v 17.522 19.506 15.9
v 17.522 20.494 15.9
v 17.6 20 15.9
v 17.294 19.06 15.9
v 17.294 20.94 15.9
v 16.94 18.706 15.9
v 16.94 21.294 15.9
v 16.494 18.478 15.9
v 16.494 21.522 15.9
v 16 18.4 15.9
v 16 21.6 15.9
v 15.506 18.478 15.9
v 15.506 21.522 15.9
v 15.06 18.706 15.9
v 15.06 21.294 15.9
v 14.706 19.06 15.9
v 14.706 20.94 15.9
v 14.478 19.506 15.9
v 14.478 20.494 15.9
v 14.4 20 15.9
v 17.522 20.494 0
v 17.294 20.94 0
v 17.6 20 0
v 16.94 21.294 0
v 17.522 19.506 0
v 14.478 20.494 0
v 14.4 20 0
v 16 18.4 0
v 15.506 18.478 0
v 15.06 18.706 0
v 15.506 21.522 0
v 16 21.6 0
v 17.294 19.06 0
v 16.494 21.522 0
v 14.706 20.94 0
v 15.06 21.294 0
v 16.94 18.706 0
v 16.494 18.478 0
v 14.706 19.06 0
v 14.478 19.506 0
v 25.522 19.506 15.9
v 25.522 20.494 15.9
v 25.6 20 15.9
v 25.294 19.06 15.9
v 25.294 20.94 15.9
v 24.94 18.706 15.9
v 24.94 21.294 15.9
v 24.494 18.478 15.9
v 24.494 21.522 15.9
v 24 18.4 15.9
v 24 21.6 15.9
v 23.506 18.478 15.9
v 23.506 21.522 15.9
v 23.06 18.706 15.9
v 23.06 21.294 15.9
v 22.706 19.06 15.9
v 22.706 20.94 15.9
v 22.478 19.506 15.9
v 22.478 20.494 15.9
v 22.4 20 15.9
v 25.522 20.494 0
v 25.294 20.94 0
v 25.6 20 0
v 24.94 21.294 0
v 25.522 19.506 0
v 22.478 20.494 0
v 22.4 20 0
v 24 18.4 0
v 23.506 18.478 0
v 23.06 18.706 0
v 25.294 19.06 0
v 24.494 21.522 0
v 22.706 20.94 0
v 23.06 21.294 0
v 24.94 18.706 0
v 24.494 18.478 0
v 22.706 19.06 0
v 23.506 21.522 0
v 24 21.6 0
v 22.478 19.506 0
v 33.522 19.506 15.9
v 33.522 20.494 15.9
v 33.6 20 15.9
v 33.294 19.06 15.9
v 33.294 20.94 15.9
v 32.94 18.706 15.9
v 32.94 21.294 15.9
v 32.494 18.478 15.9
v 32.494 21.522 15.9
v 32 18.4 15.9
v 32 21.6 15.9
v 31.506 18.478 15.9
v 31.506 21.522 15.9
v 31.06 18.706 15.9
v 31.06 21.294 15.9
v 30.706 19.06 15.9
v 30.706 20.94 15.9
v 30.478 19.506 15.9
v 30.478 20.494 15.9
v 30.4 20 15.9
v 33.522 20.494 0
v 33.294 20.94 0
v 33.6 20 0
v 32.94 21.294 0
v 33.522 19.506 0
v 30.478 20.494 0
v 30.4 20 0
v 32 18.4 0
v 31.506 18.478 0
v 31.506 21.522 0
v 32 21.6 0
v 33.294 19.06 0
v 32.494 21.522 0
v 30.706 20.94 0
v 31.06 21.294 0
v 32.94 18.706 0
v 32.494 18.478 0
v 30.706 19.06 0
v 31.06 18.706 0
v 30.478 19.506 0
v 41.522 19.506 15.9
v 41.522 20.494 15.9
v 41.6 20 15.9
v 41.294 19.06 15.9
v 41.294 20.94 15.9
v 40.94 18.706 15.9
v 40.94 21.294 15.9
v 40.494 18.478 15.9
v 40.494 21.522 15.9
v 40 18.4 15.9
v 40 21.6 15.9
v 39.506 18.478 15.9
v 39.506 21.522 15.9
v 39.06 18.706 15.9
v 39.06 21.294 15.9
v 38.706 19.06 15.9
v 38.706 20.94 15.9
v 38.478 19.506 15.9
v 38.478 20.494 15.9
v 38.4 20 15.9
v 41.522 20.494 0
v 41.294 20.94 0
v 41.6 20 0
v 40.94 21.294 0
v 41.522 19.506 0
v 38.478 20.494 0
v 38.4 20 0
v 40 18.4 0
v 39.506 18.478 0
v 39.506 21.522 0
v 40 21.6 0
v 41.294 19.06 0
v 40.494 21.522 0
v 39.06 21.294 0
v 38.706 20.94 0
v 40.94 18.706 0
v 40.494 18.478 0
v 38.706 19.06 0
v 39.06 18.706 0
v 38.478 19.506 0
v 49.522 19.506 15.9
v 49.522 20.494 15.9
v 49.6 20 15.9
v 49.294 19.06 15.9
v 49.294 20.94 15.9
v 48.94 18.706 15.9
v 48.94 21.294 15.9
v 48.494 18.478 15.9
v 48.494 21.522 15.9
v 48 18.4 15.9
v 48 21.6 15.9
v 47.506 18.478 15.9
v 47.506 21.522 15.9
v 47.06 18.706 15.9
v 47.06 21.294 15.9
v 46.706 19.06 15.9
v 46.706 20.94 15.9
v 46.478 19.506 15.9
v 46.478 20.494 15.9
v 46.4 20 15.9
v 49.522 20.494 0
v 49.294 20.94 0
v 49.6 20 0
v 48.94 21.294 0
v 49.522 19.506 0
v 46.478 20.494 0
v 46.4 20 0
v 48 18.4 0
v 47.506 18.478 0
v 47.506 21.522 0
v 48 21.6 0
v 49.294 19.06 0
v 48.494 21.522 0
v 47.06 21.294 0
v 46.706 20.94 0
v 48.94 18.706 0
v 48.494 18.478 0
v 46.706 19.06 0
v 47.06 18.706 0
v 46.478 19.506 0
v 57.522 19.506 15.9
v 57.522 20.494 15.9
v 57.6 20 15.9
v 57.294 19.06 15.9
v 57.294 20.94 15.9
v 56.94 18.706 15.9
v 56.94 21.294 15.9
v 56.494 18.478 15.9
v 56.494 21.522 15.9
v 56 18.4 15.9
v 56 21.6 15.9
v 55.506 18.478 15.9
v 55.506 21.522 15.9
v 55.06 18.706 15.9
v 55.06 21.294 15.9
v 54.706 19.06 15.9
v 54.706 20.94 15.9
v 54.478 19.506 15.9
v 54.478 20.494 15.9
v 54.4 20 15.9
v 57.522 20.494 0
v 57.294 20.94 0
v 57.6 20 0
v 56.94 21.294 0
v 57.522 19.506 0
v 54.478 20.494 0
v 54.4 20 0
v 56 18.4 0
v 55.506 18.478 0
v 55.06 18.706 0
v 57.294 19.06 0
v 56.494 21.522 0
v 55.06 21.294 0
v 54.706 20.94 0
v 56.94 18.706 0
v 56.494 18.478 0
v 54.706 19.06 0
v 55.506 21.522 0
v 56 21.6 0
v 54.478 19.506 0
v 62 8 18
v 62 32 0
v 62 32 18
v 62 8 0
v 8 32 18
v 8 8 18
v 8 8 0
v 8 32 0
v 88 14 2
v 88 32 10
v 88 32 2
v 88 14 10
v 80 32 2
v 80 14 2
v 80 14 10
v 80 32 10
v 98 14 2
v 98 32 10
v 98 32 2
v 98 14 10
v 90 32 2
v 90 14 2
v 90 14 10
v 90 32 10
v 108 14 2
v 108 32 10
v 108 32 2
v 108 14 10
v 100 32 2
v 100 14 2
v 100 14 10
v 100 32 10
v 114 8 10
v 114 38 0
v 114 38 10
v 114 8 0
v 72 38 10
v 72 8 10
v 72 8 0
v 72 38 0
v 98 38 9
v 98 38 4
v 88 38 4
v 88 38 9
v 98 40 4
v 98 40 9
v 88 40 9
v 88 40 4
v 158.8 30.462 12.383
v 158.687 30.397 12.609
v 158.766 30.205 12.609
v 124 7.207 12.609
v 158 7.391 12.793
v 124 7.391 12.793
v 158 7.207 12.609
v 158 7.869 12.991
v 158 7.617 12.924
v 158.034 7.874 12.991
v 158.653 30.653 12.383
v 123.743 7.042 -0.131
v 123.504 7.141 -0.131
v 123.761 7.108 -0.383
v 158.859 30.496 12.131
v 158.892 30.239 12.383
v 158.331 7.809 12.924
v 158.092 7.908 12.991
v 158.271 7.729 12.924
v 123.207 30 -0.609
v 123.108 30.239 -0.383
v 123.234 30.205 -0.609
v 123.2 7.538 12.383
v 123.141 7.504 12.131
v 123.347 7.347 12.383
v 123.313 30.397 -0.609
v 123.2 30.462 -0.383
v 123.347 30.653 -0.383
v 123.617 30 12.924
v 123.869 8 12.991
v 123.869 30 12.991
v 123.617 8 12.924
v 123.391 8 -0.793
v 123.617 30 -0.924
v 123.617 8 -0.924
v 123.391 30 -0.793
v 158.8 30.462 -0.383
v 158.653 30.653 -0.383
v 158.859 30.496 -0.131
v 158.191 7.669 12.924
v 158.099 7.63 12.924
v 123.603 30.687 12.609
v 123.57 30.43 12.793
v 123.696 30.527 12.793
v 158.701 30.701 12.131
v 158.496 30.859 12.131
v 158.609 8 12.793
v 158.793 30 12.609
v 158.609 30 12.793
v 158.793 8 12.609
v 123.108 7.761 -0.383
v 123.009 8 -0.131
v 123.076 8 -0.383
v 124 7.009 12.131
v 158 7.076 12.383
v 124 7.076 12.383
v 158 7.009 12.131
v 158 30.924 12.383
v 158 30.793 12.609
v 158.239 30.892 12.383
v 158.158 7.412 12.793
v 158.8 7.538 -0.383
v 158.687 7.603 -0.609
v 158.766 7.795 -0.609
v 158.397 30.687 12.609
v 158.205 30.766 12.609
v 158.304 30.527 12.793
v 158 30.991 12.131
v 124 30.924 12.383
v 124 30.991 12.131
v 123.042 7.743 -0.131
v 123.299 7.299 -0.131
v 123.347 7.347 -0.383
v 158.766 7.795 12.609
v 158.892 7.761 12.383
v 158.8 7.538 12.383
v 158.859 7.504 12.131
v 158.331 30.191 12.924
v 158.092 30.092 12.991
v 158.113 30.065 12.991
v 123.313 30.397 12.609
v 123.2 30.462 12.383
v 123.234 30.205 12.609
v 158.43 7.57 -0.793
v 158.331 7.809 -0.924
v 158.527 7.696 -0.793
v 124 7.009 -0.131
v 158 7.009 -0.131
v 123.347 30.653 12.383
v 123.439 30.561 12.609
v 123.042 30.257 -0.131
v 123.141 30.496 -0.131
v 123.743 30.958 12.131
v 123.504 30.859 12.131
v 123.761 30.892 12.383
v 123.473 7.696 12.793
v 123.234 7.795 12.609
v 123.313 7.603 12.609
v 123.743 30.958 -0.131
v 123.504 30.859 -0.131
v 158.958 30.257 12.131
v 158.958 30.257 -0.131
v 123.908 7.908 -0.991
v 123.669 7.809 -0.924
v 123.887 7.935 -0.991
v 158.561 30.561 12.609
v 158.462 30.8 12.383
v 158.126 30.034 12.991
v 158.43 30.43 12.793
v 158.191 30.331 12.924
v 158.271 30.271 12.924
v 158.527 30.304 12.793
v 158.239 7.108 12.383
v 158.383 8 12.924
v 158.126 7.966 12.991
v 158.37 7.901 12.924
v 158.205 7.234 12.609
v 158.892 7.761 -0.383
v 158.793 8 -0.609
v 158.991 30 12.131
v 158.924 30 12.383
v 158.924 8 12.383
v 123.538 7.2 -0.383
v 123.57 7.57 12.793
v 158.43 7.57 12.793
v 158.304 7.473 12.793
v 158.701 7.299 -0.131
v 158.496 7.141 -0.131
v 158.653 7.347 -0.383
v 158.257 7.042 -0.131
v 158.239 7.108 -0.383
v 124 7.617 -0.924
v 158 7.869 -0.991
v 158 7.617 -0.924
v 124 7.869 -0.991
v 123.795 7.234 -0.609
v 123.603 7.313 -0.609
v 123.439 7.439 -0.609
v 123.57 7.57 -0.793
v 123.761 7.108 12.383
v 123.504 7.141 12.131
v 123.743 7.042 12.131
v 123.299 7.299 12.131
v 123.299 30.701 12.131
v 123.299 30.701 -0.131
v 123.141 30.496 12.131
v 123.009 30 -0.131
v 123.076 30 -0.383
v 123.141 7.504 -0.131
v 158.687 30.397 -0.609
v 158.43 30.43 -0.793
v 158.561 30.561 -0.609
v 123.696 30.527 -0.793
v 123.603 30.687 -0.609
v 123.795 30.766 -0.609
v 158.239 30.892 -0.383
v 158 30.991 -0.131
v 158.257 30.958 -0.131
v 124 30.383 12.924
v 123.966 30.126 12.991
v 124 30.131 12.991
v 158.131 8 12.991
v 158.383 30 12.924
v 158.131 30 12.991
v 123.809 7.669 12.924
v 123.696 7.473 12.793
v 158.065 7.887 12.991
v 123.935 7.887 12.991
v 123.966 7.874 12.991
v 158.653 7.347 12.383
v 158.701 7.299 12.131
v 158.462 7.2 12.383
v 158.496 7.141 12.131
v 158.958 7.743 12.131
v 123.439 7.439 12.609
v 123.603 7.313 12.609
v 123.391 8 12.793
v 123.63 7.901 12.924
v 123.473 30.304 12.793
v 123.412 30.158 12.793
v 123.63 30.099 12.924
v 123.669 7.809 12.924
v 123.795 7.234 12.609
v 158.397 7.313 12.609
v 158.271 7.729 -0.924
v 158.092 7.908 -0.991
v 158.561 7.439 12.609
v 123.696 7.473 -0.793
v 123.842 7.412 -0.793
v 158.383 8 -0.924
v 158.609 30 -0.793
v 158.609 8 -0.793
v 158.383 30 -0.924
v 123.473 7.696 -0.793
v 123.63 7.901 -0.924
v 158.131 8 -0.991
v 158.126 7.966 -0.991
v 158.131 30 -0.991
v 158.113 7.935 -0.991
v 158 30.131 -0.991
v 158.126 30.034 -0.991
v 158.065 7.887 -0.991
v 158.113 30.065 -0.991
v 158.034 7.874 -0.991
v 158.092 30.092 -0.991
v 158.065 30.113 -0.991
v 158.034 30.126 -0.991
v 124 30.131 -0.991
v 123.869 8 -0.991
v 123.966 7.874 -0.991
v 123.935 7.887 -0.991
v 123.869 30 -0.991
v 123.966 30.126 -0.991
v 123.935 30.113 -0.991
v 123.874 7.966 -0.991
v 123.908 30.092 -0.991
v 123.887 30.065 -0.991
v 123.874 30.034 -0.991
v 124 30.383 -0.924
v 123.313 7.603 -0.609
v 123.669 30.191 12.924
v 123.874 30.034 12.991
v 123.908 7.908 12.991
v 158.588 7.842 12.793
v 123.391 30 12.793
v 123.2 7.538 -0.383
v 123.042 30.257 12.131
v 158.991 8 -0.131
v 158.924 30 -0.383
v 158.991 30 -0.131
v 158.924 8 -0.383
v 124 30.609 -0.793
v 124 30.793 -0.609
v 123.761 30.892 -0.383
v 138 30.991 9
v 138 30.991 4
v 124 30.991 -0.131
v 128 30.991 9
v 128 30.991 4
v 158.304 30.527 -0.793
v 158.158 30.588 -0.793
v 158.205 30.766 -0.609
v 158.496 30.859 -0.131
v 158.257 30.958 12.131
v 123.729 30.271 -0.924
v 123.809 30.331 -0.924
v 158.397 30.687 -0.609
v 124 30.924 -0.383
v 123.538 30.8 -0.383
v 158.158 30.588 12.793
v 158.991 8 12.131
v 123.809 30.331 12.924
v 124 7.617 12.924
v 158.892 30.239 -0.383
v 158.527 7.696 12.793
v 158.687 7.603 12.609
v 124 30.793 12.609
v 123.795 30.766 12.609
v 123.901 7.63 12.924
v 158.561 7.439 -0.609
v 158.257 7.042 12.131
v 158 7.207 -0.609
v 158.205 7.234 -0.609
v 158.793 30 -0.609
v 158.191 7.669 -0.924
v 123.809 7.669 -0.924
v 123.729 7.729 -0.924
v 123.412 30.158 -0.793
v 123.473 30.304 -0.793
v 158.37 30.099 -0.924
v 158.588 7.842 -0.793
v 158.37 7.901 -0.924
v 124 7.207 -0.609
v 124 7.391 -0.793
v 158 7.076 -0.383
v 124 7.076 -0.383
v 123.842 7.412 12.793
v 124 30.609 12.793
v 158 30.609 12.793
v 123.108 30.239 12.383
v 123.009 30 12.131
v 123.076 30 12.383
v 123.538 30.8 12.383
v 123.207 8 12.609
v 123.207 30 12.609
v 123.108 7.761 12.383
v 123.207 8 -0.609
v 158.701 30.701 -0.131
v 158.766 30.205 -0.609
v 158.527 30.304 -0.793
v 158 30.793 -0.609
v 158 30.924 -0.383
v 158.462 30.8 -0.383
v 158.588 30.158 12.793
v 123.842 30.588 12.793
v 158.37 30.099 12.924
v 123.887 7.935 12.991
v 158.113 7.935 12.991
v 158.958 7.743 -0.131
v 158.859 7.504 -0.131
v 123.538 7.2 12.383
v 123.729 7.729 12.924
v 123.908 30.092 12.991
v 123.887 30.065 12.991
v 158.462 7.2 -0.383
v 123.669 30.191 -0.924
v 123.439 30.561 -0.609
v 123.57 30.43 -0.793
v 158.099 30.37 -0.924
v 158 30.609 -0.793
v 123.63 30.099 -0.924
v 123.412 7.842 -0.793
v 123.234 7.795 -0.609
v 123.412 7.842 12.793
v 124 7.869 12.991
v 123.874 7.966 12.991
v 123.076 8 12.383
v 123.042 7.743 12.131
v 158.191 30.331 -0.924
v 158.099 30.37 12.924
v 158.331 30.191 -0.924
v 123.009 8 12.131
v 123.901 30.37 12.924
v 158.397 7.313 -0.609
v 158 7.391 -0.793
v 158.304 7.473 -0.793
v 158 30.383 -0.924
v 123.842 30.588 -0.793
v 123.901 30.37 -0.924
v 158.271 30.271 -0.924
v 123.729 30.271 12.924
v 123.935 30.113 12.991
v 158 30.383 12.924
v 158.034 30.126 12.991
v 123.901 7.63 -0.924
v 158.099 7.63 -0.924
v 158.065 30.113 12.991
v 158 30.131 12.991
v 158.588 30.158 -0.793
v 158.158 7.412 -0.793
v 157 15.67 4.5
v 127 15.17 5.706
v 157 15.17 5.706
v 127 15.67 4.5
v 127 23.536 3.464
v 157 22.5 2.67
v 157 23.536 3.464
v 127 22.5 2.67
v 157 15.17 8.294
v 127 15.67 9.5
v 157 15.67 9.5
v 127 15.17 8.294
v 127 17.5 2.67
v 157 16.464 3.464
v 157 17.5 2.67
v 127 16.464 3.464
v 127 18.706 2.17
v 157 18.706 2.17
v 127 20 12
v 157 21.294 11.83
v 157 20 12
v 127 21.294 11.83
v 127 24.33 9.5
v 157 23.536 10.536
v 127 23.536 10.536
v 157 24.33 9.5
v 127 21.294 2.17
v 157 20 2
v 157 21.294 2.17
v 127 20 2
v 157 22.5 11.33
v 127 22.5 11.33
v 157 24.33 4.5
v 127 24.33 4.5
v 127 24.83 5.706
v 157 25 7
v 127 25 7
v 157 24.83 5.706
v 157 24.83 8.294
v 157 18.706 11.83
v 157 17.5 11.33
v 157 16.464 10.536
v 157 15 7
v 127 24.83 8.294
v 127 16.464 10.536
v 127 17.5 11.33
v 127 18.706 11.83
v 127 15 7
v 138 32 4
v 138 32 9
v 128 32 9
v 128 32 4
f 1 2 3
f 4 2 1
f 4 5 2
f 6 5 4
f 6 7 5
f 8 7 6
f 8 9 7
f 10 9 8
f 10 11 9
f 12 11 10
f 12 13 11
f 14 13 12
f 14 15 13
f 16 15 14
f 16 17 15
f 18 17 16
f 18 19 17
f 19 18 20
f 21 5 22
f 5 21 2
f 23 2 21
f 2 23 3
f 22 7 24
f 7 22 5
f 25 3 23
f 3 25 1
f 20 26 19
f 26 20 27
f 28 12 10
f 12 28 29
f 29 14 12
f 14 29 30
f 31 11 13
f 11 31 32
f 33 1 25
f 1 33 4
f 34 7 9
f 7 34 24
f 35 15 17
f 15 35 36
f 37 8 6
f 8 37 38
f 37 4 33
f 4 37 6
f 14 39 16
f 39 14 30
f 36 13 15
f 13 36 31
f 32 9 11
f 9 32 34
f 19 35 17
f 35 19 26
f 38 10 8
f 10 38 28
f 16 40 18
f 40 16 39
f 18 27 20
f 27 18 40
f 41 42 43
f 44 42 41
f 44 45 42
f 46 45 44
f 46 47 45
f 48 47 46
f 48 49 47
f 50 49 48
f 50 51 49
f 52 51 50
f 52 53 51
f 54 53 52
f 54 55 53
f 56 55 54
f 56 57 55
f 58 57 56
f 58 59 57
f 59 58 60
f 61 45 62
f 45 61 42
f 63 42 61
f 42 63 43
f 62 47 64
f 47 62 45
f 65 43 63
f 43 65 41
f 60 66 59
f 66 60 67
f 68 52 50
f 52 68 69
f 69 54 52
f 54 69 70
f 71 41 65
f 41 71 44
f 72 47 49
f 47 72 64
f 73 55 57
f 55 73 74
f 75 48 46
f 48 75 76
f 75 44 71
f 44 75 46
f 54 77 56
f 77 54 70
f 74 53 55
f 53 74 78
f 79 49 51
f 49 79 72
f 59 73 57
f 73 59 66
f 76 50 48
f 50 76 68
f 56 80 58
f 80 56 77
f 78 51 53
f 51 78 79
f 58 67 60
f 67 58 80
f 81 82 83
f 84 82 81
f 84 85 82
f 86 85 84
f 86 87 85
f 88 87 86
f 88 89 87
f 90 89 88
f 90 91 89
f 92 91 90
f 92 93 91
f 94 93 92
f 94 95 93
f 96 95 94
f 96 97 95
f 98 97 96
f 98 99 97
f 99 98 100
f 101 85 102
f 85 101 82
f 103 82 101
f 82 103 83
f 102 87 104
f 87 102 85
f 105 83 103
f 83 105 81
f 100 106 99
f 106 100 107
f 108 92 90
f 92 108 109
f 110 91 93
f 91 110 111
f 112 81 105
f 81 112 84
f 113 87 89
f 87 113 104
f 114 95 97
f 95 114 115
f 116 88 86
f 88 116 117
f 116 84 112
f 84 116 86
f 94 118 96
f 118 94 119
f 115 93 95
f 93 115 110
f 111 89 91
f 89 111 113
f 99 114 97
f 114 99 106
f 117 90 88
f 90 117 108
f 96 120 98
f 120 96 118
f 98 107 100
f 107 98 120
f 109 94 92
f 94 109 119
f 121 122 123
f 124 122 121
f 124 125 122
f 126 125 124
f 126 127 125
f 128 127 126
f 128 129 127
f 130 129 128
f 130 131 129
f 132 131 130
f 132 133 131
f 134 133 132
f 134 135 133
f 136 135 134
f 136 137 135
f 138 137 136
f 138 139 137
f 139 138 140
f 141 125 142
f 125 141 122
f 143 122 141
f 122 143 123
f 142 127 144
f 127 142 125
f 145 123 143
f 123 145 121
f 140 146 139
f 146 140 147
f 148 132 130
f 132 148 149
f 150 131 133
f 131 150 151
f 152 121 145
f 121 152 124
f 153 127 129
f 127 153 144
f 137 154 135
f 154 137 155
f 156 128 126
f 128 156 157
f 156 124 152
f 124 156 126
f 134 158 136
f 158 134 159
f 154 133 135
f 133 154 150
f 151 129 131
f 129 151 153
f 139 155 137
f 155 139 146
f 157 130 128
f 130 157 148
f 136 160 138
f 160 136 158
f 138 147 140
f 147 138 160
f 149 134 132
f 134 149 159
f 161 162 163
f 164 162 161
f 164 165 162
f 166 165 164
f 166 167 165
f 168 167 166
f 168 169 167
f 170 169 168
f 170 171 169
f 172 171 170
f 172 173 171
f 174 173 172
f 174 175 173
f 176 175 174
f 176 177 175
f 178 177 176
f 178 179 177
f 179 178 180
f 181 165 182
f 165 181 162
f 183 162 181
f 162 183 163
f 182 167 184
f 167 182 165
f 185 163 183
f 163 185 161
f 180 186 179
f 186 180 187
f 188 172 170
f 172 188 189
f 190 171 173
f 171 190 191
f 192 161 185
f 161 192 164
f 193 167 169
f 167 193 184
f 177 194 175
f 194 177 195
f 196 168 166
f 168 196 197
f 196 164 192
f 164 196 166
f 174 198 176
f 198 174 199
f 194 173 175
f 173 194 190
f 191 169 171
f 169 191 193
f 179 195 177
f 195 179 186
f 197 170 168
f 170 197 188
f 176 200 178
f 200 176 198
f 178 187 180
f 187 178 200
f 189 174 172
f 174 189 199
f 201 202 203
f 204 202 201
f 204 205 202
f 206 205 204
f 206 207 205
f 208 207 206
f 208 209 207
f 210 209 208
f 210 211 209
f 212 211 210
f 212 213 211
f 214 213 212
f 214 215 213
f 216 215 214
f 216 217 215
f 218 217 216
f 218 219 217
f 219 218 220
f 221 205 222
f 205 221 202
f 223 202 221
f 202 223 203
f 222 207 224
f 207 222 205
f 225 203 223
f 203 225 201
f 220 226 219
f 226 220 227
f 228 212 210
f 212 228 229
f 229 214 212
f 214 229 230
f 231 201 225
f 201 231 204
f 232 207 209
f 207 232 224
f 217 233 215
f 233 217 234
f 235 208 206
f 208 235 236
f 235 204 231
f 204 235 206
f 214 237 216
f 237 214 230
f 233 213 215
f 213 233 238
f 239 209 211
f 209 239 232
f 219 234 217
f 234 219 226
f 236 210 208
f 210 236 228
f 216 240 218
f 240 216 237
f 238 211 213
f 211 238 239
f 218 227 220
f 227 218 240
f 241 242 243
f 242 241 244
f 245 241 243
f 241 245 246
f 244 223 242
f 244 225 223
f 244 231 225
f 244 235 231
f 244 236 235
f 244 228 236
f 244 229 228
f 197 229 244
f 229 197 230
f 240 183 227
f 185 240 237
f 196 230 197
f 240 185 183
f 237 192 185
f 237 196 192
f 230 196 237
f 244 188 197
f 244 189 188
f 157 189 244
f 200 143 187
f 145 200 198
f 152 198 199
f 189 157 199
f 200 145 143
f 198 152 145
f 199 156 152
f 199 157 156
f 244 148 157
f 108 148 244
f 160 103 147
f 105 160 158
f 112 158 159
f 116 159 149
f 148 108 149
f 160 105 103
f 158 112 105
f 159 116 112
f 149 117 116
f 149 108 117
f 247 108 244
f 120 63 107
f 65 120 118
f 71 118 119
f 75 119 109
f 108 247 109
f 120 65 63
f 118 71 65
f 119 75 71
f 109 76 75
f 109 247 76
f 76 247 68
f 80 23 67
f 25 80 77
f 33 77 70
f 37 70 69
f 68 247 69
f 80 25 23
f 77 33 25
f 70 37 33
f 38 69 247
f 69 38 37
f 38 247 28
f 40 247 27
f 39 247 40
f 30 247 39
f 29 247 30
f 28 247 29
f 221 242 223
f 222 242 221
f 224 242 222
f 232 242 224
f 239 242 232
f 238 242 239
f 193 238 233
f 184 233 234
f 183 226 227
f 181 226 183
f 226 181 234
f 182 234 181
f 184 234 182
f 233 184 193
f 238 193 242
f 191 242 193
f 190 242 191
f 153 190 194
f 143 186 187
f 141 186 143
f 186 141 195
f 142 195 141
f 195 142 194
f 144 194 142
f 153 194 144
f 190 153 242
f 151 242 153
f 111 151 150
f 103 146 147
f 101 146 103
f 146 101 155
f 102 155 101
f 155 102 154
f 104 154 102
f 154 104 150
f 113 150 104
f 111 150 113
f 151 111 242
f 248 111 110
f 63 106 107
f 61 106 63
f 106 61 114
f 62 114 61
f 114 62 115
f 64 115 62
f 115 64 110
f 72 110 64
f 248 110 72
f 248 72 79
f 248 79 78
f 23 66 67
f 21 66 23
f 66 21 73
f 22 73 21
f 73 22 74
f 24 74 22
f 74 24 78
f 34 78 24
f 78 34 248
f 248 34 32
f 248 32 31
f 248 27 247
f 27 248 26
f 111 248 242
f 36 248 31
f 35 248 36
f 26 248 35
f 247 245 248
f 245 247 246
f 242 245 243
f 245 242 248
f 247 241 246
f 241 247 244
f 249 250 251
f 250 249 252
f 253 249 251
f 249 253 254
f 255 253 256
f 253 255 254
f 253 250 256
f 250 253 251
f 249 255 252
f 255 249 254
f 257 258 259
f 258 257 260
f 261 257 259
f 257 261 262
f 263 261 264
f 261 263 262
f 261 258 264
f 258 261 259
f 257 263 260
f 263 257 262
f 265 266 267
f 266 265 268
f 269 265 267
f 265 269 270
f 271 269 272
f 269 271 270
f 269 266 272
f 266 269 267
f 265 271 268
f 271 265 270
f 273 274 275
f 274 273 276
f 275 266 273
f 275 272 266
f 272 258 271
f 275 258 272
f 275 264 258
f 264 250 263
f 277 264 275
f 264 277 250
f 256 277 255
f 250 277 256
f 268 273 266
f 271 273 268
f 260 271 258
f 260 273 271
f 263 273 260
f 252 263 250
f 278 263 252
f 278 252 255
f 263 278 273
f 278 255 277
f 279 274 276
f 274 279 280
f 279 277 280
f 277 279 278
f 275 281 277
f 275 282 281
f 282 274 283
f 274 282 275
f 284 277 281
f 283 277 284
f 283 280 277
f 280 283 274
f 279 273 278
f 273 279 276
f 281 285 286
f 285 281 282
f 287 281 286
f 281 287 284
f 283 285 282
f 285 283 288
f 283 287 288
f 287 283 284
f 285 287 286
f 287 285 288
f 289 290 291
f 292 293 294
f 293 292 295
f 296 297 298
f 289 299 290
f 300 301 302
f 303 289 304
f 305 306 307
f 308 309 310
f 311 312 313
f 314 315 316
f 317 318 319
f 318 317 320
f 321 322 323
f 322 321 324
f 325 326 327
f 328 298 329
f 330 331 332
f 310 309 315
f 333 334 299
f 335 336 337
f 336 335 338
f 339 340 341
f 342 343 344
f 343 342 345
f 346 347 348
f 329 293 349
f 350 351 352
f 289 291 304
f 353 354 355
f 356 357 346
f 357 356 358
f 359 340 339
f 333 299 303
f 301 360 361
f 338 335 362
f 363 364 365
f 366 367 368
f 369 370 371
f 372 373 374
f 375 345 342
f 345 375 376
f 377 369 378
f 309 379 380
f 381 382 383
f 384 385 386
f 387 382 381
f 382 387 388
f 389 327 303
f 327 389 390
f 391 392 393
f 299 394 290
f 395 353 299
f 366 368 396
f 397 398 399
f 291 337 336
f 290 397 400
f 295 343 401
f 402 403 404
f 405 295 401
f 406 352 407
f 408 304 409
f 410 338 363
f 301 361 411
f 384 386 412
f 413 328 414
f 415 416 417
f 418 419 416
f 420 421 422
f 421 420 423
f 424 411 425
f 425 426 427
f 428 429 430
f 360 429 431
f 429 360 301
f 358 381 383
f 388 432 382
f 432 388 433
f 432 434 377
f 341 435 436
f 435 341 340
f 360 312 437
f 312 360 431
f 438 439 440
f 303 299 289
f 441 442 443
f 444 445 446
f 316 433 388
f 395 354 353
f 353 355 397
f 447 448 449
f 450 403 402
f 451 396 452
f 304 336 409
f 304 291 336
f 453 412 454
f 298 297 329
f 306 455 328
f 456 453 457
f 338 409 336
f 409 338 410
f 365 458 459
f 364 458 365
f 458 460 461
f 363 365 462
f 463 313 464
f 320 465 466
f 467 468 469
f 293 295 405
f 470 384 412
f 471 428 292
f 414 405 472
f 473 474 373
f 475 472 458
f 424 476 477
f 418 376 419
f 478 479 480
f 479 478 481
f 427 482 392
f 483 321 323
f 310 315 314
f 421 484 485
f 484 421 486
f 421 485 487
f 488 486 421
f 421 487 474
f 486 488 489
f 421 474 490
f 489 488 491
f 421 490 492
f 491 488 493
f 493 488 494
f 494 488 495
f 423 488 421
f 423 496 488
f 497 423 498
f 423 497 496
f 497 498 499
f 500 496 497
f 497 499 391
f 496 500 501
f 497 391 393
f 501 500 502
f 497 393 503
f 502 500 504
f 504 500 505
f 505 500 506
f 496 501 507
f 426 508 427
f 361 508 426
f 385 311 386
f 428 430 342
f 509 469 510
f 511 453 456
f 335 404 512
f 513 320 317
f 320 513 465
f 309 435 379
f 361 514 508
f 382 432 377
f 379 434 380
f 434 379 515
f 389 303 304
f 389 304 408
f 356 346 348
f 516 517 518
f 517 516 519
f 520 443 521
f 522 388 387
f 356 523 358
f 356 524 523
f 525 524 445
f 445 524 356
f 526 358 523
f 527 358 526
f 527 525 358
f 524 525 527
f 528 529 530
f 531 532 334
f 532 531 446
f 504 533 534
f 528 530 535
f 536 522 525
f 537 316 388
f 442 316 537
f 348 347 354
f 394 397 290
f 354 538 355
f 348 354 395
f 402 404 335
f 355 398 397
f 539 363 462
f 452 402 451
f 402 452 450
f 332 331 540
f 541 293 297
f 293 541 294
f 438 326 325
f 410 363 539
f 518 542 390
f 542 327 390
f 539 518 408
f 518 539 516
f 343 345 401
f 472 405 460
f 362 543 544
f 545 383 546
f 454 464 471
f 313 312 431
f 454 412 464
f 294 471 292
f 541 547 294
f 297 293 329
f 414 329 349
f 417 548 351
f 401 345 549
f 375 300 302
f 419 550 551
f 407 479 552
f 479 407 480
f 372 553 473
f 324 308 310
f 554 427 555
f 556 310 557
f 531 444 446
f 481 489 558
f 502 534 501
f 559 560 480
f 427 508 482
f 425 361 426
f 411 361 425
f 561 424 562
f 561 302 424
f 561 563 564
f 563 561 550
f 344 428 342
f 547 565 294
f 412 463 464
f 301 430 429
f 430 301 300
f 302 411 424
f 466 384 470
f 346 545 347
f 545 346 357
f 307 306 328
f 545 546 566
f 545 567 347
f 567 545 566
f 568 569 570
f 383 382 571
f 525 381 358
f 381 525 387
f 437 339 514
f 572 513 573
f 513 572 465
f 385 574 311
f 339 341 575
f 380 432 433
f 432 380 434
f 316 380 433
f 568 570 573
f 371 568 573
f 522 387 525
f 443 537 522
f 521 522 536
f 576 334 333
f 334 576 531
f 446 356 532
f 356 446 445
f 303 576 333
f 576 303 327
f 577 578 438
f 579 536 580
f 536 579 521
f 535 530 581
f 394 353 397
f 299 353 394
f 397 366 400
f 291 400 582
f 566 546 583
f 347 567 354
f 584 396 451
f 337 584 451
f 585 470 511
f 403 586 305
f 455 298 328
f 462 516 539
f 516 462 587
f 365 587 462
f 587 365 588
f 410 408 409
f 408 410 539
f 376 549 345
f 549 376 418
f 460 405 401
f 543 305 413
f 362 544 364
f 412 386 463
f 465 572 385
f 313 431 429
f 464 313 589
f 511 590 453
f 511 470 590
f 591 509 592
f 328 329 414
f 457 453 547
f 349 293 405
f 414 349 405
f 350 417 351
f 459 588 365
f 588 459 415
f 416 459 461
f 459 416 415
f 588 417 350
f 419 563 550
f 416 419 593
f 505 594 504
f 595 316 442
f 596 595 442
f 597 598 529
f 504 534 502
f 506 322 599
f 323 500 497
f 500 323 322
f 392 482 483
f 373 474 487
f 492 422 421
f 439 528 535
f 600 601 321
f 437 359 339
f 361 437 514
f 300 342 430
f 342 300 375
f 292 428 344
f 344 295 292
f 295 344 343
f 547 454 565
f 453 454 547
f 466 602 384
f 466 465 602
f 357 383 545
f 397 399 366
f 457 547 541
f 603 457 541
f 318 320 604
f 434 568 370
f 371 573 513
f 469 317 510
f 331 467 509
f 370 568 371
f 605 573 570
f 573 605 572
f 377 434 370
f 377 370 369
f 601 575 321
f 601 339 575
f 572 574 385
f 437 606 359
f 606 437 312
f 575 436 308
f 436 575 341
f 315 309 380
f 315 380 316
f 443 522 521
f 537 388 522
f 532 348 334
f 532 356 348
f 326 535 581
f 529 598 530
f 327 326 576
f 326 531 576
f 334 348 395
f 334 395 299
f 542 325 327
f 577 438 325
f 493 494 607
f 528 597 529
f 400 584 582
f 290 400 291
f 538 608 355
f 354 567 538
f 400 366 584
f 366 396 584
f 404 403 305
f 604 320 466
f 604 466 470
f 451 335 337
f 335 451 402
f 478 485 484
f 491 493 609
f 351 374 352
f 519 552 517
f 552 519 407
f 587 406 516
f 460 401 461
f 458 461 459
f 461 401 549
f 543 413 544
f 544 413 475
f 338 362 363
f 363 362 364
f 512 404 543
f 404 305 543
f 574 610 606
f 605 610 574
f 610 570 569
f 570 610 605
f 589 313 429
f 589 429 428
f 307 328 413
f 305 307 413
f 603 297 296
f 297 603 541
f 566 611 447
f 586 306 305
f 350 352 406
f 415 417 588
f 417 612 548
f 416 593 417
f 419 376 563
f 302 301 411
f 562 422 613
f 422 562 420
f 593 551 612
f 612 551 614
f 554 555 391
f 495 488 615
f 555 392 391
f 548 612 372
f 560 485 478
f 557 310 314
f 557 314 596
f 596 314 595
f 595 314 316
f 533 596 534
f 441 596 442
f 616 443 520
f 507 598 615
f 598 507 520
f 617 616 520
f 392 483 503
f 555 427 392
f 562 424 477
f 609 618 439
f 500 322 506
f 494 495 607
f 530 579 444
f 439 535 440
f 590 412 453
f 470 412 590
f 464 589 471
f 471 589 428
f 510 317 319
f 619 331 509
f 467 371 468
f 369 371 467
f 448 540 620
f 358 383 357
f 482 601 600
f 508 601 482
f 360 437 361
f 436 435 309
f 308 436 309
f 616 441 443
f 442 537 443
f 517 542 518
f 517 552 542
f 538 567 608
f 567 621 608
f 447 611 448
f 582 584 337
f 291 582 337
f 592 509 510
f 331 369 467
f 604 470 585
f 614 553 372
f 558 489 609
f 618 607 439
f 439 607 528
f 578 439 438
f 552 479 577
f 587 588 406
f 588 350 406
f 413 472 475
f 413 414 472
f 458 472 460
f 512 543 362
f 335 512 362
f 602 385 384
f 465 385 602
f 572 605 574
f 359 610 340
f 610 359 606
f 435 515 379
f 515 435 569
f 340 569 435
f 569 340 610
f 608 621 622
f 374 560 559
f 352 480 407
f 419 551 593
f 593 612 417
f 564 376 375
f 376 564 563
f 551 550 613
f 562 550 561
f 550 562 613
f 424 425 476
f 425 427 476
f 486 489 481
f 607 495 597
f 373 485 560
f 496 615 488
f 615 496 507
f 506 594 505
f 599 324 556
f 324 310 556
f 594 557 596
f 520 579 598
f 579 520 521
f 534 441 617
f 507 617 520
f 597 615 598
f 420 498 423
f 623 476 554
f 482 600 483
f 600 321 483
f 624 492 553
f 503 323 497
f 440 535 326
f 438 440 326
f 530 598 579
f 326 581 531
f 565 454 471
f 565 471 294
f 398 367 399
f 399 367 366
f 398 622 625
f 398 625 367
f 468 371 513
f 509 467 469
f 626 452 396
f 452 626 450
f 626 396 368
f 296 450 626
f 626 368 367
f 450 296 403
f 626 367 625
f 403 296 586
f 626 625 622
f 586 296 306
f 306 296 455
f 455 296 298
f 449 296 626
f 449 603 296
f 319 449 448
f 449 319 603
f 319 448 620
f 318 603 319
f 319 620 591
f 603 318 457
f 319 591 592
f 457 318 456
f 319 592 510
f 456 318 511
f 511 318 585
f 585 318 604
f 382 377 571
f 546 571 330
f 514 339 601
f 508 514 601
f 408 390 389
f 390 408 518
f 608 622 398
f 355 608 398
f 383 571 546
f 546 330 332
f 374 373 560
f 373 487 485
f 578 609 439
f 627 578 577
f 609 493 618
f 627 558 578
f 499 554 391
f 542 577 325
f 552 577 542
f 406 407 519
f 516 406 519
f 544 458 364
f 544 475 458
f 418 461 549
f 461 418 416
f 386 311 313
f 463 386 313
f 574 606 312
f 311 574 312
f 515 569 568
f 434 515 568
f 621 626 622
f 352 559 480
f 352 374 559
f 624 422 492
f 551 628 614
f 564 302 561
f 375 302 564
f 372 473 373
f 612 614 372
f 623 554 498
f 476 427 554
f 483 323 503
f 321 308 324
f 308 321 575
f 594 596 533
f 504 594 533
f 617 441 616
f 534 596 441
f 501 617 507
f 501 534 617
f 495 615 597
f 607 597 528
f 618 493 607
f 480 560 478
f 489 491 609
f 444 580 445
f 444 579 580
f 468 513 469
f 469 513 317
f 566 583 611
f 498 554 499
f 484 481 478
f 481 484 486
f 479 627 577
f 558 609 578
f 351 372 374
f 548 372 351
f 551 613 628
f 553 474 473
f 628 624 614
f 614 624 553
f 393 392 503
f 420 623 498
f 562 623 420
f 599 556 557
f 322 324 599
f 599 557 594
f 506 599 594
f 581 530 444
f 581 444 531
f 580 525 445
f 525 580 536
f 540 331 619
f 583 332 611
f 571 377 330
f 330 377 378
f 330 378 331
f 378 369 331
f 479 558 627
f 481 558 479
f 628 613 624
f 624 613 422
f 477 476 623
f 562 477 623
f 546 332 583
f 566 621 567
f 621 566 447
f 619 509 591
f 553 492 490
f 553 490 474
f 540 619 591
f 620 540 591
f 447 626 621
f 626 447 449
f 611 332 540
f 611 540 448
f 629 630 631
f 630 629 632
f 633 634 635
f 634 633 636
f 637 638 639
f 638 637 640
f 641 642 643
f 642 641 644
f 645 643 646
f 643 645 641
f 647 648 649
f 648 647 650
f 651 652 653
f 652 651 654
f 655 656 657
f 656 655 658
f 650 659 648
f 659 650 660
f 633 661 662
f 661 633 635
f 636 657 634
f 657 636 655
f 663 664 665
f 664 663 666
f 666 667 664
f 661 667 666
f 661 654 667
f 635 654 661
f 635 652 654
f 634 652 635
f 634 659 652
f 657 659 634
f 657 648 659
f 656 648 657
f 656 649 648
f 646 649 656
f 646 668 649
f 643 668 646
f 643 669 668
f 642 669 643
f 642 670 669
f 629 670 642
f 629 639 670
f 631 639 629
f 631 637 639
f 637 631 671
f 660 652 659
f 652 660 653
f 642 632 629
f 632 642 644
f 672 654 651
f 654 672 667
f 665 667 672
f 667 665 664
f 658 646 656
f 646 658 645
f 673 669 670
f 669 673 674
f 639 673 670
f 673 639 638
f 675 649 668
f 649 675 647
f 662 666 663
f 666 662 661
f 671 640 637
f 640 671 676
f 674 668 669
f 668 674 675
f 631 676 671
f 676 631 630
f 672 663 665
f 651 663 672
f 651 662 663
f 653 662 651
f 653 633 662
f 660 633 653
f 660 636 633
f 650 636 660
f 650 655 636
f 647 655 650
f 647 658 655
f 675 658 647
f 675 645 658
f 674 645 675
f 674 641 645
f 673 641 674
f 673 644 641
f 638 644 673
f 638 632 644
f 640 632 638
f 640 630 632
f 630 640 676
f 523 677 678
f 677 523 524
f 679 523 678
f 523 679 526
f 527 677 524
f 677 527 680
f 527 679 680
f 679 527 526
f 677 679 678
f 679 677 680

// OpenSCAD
// file: ../../f1_1/cad/common.scad
// Shared constants and primitives for F1.1 mechanical design.

filament_diameter = 1.75;
ptfe_inner_diameter = 2.0;
mount_hole_diameter = 3.2;
mount_slot_width = 3.5;
mount_slot_length = 10.0;

module rounded_block(size_vec, radius = 2) {
    x = size_vec[0];
    y = size_vec[1];
    z = size_vec[2];

    minkowski() {
        cube([x - (2 * radius), y - (2 * radius), z - (2 * radius)], center = false);
        sphere(r = radius, $fn = 24);
    }
}

module m3_hole(height = 12, diameter = mount_hole_diameter) {
    cylinder(h = height, d = diameter, center = false, $fn = 32);
}

module slot_hole(length = mount_slot_length, width = mount_slot_width, height = 8) {
    hull() {
        translate([0, 0, 0]) {
            cylinder(h = height, d = width, center = false, $fn = 24);
        }
        translate([length, 0, 0]) {
            cylinder(h = height, d = width, center = false, $fn = 24);
        }
    }
}

module filament_channel(length = 30, diameter = ptfe_inner_diameter, axis = "x") {
    if (axis == "x") {
        rotate([0, 90, 0]) {
            cylinder(h = length, d = diameter, center = true, $fn = 36);
        }
    } else if (axis == "y") {
        rotate([90, 0, 0]) {
            cylinder(h = length, d = diameter, center = true, $fn = 36);
        }
    } else {
        cylinder(h = length, d = diameter, center = true, $fn = 36);
    }
}

module pc4_m6_fitting_port() {
    difference() {
        cylinder(h = 8, d = 8, center = false, $fn = 24);
        translate([0, 0, -0.5]) {
            cylinder(h = 9, d = 4.6, center = false, $fn = 24);
        }
    }
}

module modular_rail(width = 80, depth = 12, length = 210) {
    difference() {
        cube([length, width, depth], center = false);

        for (slot_x = [15 : 20 : length - 15]) {
            translate([slot_x, width * 0.5, 0]) {
                slot_hole(length = mount_slot_length, width = mount_slot_width, height = depth + 1);
            }
        }
    }
}
// main file
use <../../f1_1/cad/common.scad>;

// Tool holders for hex keys, spare blades, and PTFE offcuts.

module hex_key_holder() {
    difference() {
        cube([54, 24, 18], center = false);
        for (x = [8, 16, 24, 32, 40, 48]) {
            translate([x, 12, -0.1]) {
                cylinder(h = 16, d = 3.2, $fn = 20);
            }
        }
    }
}

module blade_magazine() {
    difference() {
        cube([42, 30, 10], center = false);
        for (x = [8, 18, 28]) {
            translate([x, 6, 2]) {
                cube([8, 18, 8.2], center = false);
            }
        }
    }

    // Snap tab for mounting onto enclosure wall.
    translate([16, 29, 4]) {
        cube([10, 3, 5], center = false);
    }
}

module ptfe_spool_clip() {
    difference() {
        rounded_block([36, 24, 14], radius = 1);
        translate([18, 12, 7]) {
            rotate([0, 90, 0]) {
                cylinder(h = 30, d = 10, center = true, $fn = 24);
            }
        }
    }

    translate([4, 22, 4]) {
        cube([10, 2, 5], center = false);
    }
}

module accessory_layout() {
    translate([8, 8, 0]) {
        hex_key_holder();
    }

    translate([72, 8, 0]) {
        blade_magazine();
    }

    translate([124, 8, 0]) {
        ptfe_spool_clip();
    }
}

accessory_layout();
